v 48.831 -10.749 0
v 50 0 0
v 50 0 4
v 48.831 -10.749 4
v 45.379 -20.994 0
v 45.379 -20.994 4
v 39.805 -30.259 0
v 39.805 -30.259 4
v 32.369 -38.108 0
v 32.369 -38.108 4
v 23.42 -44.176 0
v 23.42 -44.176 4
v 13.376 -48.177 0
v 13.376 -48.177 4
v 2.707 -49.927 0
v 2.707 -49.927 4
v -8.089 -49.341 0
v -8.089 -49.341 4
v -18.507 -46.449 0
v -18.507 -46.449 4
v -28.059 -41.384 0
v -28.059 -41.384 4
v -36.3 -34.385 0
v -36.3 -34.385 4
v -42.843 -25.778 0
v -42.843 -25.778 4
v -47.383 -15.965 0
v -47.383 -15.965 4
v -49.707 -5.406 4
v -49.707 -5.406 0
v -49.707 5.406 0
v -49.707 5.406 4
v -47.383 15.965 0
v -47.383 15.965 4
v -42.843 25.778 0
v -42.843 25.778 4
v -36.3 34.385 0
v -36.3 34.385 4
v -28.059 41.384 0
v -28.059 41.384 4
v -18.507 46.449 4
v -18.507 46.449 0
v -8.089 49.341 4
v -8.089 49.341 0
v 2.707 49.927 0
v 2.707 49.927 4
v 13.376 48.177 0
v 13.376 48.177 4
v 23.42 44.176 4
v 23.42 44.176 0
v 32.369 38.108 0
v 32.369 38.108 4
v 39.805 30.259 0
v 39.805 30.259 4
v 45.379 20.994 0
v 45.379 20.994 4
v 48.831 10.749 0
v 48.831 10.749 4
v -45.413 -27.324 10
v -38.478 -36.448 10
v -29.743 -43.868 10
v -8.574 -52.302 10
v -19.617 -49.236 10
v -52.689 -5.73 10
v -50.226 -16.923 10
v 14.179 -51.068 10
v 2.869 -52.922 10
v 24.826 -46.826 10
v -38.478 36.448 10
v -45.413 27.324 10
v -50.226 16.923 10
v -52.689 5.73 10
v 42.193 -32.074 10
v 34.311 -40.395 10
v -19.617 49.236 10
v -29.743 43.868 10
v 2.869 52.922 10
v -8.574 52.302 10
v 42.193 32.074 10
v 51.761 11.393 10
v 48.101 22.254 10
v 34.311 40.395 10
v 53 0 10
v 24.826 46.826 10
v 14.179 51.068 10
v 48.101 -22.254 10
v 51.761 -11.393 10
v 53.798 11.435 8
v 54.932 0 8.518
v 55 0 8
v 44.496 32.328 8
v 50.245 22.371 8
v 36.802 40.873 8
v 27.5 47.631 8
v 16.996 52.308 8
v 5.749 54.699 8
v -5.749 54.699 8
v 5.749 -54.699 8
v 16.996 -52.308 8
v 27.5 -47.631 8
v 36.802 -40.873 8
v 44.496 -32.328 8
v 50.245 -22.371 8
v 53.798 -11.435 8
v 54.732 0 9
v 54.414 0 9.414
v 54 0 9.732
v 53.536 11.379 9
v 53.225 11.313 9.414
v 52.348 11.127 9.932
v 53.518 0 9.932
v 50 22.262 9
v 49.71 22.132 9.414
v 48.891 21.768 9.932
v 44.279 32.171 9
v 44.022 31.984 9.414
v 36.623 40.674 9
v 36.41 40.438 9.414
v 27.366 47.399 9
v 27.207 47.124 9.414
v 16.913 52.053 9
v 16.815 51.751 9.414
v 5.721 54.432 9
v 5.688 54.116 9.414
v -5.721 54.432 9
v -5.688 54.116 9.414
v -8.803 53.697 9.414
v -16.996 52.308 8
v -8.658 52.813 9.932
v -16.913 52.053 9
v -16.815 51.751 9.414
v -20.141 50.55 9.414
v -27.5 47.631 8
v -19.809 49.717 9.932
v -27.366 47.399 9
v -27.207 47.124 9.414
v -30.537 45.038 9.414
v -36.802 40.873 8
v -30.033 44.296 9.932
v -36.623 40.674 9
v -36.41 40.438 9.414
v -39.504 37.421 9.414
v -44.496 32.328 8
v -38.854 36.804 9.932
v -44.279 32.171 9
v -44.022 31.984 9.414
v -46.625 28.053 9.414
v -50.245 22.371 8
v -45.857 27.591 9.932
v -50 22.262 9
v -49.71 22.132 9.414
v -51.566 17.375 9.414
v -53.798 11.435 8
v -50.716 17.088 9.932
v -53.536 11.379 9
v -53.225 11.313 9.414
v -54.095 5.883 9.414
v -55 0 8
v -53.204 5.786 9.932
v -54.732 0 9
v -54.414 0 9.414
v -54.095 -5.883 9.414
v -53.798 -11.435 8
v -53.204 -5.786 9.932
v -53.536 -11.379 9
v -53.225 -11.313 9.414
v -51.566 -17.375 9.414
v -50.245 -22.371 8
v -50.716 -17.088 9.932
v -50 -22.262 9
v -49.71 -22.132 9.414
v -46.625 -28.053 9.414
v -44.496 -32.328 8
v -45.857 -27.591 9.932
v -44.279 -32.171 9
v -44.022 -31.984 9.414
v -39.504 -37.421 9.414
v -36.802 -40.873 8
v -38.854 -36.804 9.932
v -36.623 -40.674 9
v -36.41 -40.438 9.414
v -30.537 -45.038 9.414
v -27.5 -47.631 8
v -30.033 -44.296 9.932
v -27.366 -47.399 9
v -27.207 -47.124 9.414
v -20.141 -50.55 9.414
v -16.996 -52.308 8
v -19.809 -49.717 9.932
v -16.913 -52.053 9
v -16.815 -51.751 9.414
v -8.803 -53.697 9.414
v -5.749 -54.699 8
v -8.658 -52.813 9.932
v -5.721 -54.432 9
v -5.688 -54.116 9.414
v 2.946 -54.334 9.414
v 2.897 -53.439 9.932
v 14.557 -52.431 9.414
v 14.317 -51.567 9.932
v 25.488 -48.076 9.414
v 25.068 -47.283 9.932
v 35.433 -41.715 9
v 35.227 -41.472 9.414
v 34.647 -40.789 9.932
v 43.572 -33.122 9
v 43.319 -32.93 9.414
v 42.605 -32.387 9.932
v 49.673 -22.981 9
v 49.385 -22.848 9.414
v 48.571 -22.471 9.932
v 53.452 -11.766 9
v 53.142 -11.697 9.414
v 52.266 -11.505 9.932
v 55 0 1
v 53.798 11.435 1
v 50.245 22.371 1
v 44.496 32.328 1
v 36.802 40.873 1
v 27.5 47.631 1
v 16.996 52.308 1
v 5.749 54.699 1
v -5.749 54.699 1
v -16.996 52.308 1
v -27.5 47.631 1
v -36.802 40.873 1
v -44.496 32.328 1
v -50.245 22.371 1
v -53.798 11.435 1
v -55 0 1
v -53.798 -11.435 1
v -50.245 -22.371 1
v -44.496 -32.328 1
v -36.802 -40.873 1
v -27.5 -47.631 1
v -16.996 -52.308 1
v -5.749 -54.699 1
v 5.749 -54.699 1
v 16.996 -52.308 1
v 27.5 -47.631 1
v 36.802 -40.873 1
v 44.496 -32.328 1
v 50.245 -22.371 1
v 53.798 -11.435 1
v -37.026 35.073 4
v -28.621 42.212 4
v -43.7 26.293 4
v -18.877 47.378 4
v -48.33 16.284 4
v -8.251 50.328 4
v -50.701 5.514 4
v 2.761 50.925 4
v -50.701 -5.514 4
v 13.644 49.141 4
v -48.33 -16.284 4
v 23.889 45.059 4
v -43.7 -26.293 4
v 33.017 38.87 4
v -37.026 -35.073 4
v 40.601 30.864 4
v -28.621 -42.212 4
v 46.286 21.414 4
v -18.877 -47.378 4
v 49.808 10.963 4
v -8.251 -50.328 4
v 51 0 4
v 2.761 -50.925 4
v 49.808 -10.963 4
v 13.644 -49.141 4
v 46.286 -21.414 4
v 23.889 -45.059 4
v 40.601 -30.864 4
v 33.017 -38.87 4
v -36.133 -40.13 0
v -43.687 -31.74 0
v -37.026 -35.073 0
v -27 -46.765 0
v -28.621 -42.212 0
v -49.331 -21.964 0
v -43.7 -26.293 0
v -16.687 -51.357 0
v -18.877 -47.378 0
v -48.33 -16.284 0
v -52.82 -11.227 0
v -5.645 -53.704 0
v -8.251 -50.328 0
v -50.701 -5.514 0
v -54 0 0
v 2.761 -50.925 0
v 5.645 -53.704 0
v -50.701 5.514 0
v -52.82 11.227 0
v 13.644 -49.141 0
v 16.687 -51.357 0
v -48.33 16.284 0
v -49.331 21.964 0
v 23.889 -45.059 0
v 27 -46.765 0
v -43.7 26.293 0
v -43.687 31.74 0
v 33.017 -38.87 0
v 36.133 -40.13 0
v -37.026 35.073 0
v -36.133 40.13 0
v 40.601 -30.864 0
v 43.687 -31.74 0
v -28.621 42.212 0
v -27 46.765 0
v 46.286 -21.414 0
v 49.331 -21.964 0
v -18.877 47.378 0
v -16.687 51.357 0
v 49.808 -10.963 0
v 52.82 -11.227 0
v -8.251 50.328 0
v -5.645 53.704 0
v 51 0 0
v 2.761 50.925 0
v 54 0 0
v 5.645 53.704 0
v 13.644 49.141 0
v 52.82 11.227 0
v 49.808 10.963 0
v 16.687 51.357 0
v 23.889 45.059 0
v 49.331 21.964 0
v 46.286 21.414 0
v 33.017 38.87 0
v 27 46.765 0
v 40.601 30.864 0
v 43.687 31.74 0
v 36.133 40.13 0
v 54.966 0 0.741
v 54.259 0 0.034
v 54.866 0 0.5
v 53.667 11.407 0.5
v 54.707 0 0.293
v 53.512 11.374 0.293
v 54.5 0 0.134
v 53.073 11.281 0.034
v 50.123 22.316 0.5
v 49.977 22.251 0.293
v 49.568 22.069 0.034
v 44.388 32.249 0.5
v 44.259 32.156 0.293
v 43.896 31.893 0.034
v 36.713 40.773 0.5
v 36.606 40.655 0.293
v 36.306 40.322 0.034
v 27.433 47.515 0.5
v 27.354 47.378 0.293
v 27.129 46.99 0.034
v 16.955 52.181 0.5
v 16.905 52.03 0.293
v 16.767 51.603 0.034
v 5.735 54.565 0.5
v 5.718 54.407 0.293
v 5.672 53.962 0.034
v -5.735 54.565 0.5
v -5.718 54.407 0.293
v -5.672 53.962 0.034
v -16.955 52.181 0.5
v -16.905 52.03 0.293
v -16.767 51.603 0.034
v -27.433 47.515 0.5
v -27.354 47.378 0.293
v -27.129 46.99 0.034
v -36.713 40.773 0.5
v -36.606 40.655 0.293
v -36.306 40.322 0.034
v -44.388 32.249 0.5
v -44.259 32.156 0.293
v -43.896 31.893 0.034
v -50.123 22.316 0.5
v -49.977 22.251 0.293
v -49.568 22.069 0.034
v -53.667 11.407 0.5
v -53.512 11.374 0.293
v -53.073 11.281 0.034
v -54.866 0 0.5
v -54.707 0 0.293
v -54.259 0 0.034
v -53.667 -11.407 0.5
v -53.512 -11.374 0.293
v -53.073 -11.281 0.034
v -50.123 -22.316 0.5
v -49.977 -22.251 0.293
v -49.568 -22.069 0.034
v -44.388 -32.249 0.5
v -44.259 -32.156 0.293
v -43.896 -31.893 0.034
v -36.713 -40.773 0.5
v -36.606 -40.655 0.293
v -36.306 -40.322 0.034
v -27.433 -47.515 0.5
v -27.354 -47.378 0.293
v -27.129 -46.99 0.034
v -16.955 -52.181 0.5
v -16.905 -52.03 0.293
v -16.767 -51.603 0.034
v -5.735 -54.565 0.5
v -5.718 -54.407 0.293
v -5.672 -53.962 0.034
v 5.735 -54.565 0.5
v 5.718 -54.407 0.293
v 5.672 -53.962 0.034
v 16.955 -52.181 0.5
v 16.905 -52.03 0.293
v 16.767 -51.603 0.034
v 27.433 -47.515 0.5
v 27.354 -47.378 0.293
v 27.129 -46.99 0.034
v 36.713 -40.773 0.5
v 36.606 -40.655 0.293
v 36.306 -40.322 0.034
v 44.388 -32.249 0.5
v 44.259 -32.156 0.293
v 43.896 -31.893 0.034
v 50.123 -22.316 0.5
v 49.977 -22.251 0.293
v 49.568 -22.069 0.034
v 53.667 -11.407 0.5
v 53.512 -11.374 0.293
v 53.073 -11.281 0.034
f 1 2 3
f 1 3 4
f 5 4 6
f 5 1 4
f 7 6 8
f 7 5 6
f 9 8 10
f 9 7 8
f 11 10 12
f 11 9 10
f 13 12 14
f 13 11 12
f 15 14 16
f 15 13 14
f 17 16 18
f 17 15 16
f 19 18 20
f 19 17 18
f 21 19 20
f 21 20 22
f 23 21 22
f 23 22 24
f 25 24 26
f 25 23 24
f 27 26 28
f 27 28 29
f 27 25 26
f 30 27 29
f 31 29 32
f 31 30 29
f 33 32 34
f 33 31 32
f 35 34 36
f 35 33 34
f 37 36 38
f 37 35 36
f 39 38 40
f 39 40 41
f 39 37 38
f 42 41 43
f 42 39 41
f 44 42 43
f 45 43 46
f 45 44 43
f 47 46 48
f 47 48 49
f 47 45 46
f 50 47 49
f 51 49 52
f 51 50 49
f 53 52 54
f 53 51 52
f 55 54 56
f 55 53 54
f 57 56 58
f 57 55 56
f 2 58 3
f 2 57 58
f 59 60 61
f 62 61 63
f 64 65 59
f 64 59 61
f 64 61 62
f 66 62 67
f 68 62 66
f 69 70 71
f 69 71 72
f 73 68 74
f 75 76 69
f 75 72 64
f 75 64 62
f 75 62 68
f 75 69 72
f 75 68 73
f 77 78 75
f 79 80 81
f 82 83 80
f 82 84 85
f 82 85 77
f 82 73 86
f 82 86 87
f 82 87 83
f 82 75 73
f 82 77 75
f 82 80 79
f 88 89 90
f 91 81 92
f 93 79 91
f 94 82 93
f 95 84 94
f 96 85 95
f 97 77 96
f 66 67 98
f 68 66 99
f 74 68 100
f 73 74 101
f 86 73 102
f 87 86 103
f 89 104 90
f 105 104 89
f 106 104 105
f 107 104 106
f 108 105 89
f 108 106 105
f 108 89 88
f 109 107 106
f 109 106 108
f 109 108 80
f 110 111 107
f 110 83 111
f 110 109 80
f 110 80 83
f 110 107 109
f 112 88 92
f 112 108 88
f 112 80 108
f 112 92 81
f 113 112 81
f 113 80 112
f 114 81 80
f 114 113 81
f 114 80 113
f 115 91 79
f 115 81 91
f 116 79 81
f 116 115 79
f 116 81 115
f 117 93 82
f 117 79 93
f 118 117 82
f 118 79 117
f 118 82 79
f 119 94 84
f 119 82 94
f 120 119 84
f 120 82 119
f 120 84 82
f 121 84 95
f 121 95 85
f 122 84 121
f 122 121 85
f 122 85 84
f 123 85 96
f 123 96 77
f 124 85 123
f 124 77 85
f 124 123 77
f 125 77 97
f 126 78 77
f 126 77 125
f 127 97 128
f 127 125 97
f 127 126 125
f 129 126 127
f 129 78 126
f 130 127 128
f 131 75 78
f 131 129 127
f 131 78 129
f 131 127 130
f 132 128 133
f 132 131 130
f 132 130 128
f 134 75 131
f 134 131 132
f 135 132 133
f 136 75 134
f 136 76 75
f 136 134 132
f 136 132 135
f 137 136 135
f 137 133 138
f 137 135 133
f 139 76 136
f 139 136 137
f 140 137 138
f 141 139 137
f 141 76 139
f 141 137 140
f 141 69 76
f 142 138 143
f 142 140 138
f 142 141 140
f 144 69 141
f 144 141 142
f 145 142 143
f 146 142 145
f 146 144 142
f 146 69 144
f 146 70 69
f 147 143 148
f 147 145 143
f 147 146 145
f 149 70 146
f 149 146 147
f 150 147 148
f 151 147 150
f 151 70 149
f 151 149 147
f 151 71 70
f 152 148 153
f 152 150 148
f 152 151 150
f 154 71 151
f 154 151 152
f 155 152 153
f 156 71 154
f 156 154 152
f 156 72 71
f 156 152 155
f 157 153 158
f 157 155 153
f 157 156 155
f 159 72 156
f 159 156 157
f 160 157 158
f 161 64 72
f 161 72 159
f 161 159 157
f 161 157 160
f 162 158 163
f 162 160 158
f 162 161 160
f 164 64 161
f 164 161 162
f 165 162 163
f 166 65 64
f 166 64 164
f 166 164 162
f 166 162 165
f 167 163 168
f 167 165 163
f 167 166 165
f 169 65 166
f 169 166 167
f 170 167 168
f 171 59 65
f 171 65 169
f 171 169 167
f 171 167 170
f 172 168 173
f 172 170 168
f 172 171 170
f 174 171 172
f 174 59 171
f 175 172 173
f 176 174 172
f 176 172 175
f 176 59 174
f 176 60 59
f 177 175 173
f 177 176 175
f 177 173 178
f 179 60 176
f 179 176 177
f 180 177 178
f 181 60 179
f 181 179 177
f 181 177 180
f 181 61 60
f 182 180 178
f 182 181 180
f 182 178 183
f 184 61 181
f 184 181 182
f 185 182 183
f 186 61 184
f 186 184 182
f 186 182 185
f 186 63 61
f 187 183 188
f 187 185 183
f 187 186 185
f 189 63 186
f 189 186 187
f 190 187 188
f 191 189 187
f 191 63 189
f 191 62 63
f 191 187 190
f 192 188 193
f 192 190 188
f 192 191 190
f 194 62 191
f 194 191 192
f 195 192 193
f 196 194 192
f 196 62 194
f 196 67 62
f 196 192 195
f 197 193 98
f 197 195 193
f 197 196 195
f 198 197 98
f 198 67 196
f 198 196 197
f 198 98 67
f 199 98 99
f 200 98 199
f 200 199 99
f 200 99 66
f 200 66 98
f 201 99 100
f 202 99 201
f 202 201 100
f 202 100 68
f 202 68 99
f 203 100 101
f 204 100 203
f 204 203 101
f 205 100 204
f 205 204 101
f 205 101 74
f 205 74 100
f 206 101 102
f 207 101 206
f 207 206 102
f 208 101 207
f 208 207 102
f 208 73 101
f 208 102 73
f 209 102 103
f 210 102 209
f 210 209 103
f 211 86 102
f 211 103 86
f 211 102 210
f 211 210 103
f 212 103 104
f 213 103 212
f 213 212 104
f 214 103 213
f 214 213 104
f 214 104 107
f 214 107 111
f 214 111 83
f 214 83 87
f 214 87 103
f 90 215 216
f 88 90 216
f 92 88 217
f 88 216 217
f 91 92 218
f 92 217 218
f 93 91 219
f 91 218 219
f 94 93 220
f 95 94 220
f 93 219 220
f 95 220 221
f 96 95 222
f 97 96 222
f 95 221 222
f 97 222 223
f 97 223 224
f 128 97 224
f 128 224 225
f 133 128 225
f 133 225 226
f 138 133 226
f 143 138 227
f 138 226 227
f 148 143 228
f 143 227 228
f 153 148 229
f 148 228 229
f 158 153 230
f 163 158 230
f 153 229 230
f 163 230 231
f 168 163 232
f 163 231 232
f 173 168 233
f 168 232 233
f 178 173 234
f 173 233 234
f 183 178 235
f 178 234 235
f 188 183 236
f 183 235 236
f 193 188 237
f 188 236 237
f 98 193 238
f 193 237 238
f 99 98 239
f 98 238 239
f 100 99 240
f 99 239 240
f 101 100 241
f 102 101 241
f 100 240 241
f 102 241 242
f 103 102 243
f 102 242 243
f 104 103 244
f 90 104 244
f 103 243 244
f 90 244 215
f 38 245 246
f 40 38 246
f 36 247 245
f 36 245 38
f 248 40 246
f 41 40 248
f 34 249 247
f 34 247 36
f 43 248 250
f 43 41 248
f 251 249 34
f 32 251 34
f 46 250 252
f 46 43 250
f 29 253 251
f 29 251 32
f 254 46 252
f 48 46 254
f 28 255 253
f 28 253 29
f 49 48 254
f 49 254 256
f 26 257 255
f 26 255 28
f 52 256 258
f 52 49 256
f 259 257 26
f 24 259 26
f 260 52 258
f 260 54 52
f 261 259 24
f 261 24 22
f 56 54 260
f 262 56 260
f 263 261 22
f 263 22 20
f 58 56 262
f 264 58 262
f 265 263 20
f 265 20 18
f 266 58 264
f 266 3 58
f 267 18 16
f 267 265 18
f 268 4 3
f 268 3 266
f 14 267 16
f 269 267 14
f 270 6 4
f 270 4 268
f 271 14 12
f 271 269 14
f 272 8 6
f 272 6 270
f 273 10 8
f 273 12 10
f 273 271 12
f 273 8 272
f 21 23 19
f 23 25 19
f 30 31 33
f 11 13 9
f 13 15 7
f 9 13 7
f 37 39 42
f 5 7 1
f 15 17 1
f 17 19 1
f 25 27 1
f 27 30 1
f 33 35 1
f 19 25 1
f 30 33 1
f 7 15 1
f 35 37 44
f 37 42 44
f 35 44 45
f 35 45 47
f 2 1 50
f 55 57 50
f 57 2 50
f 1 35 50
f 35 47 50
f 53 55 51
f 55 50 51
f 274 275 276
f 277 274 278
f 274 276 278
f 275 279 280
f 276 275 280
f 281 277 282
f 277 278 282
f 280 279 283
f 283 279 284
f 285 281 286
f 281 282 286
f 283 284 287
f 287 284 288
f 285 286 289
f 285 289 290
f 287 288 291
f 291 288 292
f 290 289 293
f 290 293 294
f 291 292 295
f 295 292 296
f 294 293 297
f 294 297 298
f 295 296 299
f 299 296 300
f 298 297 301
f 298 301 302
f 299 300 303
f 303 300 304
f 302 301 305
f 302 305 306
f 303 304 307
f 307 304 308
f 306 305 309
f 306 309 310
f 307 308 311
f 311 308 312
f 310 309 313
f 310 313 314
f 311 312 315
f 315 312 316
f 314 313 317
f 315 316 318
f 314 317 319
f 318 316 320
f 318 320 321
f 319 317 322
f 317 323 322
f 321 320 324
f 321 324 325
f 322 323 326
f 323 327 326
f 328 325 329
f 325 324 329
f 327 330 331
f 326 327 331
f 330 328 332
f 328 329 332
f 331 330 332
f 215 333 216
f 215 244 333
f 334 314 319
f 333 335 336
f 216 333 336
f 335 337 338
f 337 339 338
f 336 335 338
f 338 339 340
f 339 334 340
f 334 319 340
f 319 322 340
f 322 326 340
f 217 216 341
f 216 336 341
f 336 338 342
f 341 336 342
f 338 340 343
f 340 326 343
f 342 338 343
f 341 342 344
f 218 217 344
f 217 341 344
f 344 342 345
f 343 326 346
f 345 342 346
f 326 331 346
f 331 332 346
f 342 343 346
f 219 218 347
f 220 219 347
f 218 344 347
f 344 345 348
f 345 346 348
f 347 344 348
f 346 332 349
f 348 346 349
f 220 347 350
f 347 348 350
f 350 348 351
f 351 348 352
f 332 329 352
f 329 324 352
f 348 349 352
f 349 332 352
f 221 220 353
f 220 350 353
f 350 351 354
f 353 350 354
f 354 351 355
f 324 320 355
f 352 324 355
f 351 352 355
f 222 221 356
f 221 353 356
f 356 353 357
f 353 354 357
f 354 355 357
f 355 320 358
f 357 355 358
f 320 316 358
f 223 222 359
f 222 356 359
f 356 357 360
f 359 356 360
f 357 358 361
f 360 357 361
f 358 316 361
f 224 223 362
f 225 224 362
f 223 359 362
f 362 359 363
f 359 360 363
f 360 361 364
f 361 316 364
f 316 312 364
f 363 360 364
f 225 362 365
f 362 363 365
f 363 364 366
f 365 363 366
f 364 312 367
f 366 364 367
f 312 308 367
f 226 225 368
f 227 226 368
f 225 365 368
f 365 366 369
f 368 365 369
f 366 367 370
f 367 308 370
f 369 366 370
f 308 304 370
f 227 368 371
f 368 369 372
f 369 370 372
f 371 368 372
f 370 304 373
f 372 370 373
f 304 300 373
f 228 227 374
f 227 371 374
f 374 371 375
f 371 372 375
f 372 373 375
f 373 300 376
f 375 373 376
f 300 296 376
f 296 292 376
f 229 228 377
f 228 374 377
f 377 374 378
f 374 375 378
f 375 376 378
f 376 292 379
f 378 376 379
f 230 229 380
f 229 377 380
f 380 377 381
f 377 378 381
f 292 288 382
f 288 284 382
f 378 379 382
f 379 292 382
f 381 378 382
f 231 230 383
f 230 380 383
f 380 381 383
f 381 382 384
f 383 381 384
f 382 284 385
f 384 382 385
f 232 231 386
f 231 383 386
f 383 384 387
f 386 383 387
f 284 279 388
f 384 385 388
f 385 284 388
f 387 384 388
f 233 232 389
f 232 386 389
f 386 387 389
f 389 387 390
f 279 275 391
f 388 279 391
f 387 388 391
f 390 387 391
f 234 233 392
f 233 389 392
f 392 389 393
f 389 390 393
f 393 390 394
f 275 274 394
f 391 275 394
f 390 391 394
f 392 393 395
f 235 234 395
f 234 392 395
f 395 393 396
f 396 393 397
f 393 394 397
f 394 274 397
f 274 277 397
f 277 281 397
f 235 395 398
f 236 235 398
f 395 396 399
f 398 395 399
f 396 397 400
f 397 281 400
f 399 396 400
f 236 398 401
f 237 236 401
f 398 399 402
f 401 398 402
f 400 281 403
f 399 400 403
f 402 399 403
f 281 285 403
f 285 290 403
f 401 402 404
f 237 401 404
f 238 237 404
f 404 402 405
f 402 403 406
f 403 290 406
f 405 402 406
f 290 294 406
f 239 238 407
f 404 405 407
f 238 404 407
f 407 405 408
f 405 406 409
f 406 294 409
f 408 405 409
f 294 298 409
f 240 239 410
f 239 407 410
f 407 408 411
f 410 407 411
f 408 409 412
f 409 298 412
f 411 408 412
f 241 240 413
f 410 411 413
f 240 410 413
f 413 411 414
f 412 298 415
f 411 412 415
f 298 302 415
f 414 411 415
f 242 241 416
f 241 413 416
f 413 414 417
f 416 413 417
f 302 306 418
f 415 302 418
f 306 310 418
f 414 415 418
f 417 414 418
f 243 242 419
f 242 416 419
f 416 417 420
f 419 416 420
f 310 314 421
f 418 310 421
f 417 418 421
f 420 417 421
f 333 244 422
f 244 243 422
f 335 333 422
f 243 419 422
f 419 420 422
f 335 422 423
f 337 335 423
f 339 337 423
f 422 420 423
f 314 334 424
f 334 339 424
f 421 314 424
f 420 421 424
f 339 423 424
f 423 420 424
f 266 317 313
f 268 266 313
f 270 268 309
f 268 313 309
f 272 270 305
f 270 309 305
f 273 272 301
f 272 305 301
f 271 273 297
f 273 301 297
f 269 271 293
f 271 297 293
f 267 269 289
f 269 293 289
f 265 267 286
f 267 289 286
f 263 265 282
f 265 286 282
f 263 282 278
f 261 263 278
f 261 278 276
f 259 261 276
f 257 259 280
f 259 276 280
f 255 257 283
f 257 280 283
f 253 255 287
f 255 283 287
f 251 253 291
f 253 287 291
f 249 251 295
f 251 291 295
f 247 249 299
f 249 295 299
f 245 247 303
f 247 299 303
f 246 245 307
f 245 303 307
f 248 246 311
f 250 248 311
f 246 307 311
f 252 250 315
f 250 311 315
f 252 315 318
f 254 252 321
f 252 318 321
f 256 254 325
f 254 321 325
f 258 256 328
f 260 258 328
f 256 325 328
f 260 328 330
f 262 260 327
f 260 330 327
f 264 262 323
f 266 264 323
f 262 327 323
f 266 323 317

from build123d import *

# Parameters (mm, degrees)
F0_R     = 55
F1_DEPTH = 10
F2_R     = 1
F3_R     = 51
F3_R_2   = 50
F4_DEPTH = 4
F5_R     = 2


with BuildPart() as f1:
    # F0 (on Top) → F1 (new body)
    with BuildSketch(Plane.XY):
        Circle(F0_R)
    extrude(amount=F1_DEPTH)

    # F2
    f2_edges = [f1.edges().sort_by_distance(p)[0] for p in [
        (-55, 0, 0),
    ]]
    fillet(f2_edges, radius=F2_R)

    # F3 (on face) → F4 (cut)
    with BuildSketch(Plane(origin=(0, 0, 0), x_dir=(1, 0, 0), z_dir=(0, 0, -1))):
        Circle(F3_R)
        Circle(F3_R_2, mode=Mode.SUBTRACT)
    extrude(amount=-F4_DEPTH, mode=Mode.SUBTRACT)

    # F5
    f5_edges = [f1.edges().sort_by_distance(p)[0] for p in [
        (-55, 0, 10),
    ]]
    fillet(f5_edges, radius=F5_R)


solid = f1.part
